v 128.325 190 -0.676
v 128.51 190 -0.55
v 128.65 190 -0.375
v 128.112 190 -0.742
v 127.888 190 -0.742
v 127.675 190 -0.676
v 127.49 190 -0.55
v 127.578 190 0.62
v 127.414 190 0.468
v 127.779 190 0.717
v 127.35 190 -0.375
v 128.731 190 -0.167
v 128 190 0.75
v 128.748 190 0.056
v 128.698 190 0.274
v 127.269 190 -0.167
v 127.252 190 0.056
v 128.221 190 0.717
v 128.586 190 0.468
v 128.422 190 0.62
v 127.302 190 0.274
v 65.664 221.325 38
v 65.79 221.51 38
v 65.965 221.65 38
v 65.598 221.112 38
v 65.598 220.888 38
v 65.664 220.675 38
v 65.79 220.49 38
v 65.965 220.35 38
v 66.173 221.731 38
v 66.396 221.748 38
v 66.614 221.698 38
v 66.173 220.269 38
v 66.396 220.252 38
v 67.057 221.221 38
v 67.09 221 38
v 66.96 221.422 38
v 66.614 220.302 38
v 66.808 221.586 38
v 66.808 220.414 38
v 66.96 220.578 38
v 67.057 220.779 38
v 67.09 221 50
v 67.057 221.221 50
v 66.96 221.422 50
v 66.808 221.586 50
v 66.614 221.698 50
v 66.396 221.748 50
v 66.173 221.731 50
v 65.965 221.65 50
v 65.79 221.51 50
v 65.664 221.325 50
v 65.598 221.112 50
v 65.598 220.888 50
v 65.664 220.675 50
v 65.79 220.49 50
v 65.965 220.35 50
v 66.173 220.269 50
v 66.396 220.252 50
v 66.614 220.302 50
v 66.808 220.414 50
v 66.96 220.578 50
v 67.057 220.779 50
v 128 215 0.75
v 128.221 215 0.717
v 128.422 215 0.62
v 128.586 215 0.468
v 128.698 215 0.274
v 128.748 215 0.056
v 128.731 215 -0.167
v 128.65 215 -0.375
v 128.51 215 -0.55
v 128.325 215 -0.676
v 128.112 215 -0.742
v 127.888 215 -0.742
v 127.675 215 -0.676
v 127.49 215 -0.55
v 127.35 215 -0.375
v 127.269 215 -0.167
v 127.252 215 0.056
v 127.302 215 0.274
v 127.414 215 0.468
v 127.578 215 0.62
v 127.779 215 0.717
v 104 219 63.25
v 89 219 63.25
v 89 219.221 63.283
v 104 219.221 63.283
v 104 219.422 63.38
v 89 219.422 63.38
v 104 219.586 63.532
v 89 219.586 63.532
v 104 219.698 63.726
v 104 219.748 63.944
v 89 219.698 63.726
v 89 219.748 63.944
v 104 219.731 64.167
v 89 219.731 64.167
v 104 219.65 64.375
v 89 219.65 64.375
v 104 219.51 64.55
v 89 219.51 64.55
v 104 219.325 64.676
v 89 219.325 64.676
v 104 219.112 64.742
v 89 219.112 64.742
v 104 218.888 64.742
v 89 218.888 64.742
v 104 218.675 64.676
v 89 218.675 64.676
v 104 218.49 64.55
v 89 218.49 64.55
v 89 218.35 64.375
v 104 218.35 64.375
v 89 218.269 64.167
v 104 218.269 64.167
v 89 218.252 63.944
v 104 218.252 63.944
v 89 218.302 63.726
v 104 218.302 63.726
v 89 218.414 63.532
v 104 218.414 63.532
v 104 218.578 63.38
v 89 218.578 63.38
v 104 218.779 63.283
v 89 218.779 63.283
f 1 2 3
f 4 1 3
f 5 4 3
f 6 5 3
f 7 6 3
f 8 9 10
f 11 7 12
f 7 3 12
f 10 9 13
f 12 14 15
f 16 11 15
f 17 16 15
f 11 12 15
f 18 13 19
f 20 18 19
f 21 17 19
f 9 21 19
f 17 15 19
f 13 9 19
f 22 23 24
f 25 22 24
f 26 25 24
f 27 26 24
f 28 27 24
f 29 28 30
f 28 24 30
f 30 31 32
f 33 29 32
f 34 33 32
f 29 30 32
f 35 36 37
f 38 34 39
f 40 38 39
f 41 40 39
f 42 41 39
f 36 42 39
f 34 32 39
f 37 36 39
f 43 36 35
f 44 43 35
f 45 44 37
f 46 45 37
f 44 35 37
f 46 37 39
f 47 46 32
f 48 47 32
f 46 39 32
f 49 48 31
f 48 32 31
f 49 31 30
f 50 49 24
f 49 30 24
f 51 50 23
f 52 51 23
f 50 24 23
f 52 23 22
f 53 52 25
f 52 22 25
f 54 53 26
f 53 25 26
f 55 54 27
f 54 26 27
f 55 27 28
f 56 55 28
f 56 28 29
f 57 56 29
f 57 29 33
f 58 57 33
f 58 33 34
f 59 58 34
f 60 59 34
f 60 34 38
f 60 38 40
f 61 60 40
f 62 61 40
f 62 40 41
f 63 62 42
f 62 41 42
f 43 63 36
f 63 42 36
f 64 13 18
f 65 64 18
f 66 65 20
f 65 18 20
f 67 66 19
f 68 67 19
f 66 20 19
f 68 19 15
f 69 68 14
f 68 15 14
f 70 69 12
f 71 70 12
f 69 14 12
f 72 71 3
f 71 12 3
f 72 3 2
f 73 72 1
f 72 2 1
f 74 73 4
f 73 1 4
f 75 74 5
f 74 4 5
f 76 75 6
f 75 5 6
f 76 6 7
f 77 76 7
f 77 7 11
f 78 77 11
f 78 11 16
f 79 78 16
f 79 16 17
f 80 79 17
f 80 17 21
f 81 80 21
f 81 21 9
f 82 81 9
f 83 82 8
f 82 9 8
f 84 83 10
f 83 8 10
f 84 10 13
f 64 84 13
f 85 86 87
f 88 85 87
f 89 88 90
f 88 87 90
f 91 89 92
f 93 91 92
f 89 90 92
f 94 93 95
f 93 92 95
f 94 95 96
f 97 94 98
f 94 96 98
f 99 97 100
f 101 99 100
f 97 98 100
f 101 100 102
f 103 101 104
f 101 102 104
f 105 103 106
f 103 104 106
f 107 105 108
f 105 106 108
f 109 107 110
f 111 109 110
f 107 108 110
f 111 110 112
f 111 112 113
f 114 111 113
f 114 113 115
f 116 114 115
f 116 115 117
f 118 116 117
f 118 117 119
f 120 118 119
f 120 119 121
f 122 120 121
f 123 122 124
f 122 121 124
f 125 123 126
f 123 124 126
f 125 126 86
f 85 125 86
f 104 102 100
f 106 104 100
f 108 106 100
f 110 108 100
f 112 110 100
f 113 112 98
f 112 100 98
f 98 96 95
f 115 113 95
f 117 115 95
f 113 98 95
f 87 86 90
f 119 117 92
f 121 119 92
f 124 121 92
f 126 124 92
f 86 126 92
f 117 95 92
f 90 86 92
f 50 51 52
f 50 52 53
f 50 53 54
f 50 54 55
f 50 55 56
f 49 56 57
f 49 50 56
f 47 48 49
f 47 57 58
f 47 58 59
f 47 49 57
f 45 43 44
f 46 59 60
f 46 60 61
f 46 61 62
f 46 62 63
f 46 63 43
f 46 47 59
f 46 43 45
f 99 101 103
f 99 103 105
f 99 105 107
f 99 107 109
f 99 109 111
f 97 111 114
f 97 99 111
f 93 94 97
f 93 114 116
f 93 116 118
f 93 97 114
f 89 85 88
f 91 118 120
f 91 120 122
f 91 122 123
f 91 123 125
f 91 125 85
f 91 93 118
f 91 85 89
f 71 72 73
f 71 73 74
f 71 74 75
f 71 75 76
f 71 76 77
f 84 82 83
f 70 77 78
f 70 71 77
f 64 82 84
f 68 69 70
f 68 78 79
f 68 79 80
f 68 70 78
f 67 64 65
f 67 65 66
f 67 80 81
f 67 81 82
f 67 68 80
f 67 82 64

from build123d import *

# Parameters (mm, degrees)
TC1_SPRING_START    = 38
SKETCH1_R           = 0.75
TC1_SPRING_DEPTH    = 12
TC2_AIR_START       = 190
SKETCH2_R           = 0.75
TC2_AIR_DEPTH       = 25
TC3_REFLECTOR_START = 89
SKETCH3_R           = 0.75
TC3_REFLECTOR_DEPTH = 15


with BuildPart() as part:
    # Sketch1 → tc1_spring (new body)
    with BuildSketch(Plane.XY.offset(TC1_SPRING_START)):
        with Locations((66.34, 221)):
            Circle(SKETCH1_R)
    extrude(amount=TC1_SPRING_DEPTH)


with BuildPart() as body_2:
    # Sketch2 → tc2_air (new body)
    with BuildSketch(Plane(origin=(0, 0, 0), x_dir=(1, 0, 0), z_dir=(0, 1, 0)).offset(TC2_AIR_START)):
        with Locations(Location((128, 0, 0), (0, 0, 270))):
            Circle(SKETCH2_R)
    extrude(amount=TC2_AIR_DEPTH)


with BuildPart() as body_3:
    # Sketch3 → tc3_reflector (new body)
    with BuildSketch(Plane(origin=(0, 0, 0), x_dir=(0, 0, -1), z_dir=(1, 0, 0)).offset(TC3_REFLECTOR_START)):
        with Locations((-64, 219)):
            Circle(SKETCH3_R)
    extrude(amount=TC3_REFLECTOR_DEPTH)


solid = Compound([part.part, body_2.part, body_3.part])
